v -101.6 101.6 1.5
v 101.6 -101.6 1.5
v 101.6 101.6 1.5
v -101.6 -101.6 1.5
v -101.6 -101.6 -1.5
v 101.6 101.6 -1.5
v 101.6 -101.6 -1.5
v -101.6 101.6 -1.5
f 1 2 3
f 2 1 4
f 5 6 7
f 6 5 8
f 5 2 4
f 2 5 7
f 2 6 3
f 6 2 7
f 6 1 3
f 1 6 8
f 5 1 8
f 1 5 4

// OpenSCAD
targetresistance = 10;
coppercoverage = 0.7;
boardheight = 8 * 25.4;
boardwidth = 8 * 25.4;
copperthickness = 0.5; // measured in oz
holespacing = 114;
holesize = 3;
holetoedge = 7;
fn = 18;

idealelementcount = sqrt(targetresistance / 0.0005 * copperthickness * (boardheight / boardwidth * coppercoverage));
elementcount = 2 * round(idealelementcount / 2);
traceoffset = boardwidth / elementcount;
tracelength = elementcount * boardheight;
//tracesize = traceoffset * elementcount;
tracesize = tracelength * 0.0005 / targetresistance / copperthickness;
traceisolation = traceoffset - tracesize;
copperthicknessmm = copperthickness * 0.034;
holereroutesize = round((holetoedge + holesize + traceoffset) / boardwidth * elementcount / 2) * 2 + 1;

echo("element count:", elementcount);
echo("trace size (mm):", tracesize);
echo("trace isolation (mm):", traceisolation);
echo("trace size (mil):", tracesize / 0.0254);
echo("trace isolation (mil):", traceisolation / 0.0254);
echo("approximate trace length (mm):", tracelength);
echo("approximate copper coverage (%):", tracesize / traceoffset * 100);
echo("approximate resistance: (ohms)", tracelength / tracesize * 0.0005 / copperthickness);

difference() {
	color([0.2, 0.2, 0.2]) cube([boardwidth, boardheight, 3], center = true);
	//for (side = [1, -1]) for (end = [1, -1]) translate([(boardwidth / 2 - holetoedge) * side, holespacing / 2 * end, 0]) cylinder(r = holesize / 2, h = 4, center = true, $fn = fn);
	//cylinder(r = holesize / 2, h = 4, center = true, $fn = fn);
}

color([0.85, 0.6, 0.3])
for (face = [1, -1])
translate([0, 0, face * 1.5]) union() {
	translate([-traceoffset / 2, -boardheight / 2 + traceoffset / 2, 0]) square([boardwidth - traceisolation - traceoffset, tracesize], center = true);
	for (i = [0:elementcount - 2]) translate([-boardwidth / 2 + (i + 1) * traceoffset, (-boardheight + traceoffset * 2) * (i % 2) + boardheight / 2 - traceoffset / 2, 0]) square([traceoffset + tracesize, tracesize], center = true);
	for (i = [-(elementcount - 1) / 2:(elementcount - 1) / 2]) translate([i * traceoffset, traceoffset / 2, 0]) square([tracesize, boardheight - traceisolation - traceoffset], center = true);
	for (side = [1, -1]) translate([(boardwidth / 2 - traceoffset / 2) * side, -boardheight / 2 + traceoffset, 0]) square([tracesize, traceoffset + tracesize], center = true);
}

*color([0.85, 0.6, 0.3])
for (face = [1, -1])
translate([0, 0, face * 1.5]) difference() {
	square([boardheight, boardwidth], center = true);
	for (side = [1, -1]) {
		for (i = [0:elementcount / 2 - holereroutesize]) translate([i * traceoffset * side, (((elementcount / 2 - i) % 2 == 0) ? 1 : -1) * tracesize / 2 + traceoffset / 2, 0]) square([traceisolation, boardheight - tracesize + 0.01 - traceoffset], center = true);
		for (i = [0:holereroutesize]) translate([(boardwidth / 2 - i * traceoffset) * side, ((i % 2 == 0) ? 1 : -1) * tracesize / 2, 0]) square([traceisolation, holespacing - holesize - traceoffset * 2 + 0.01], center = true);
		for (i = [0:holereroutesize]) translate([(boardwidth / 2 - i * traceoffset) * side, boardheight / 2 - ((boardheight - holespacing) / 2 - holesize / 2 - traceoffset * 1.5 + traceisolation / 2) / 2 - tracesize / 2 + ((i % 2 == 0) ? 1 : -1) * tracesize / 2, 0]) square([traceisolation, (boardheight - holespacing) / 2 - holesize / 2 - traceoffset * 1.5 + traceisolation / 2], center = true);
		for (i = [0:holereroutesize]) translate([(boardwidth / 2 - i * traceoffset) * side, -boardheight / 2 + ((boardheight - holespacing) / 2 - holesize / 2 - traceoffset * 1.5 + traceisolation / 2) / 2 + tracesize / 2 + traceoffset / 2 + ((i % 2 == 0) ? 1 : -1) * tracesize / 2, 0]) square([traceisolation, (boardheight - holespacing) / 2 - holesize / 2 - traceoffset * 1.5 + traceisolation / 2 - traceoffset], center = true);
		for (end = [1, -1]) for(bend = [1, -1]) translate([(boardwidth - holereroutesize * traceoffset + (tracesize + traceisolation / 2) * -bend) / 2 * side, holespacing / 2 * end + (holesize / 2 + traceoffset / 2) * bend, 0]) square([traceoffset * holereroutesize - traceoffset + traceisolation / 2, traceisolation], center = true);
		translate([0, ((boardheight + traceisolation) / 2 - 0.01) * side, 0]) square([boardwidth + traceisolation * 2, traceisolation], center = true);
		translate([((boardheight + traceisolation) / 2 - 0.01) * side, 0, 0]) square([traceisolation, boardwidth + traceisolation * 2], center = true);
		for (end = [1, -1]) translate([(boardwidth / 2 - holetoedge) * side, holespacing / 2 * end, 0]) circle(r = holesize / 2, center = true, $fn = fn);
		//circle(r = holesize / 2 + traceisolation / 2, center = true, $fn = fn);
	}
	translate([0, -boardheight / 2 + tracesize + traceisolation / 2, 0]) square([boardwidth - tracesize * 2, traceisolation], center = true);
	translate([boardwidth / 2 - traceoffset, -boardheight / 2 + traceoffset / 2, 0]) square([traceisolation, traceoffset], center = true);
}
